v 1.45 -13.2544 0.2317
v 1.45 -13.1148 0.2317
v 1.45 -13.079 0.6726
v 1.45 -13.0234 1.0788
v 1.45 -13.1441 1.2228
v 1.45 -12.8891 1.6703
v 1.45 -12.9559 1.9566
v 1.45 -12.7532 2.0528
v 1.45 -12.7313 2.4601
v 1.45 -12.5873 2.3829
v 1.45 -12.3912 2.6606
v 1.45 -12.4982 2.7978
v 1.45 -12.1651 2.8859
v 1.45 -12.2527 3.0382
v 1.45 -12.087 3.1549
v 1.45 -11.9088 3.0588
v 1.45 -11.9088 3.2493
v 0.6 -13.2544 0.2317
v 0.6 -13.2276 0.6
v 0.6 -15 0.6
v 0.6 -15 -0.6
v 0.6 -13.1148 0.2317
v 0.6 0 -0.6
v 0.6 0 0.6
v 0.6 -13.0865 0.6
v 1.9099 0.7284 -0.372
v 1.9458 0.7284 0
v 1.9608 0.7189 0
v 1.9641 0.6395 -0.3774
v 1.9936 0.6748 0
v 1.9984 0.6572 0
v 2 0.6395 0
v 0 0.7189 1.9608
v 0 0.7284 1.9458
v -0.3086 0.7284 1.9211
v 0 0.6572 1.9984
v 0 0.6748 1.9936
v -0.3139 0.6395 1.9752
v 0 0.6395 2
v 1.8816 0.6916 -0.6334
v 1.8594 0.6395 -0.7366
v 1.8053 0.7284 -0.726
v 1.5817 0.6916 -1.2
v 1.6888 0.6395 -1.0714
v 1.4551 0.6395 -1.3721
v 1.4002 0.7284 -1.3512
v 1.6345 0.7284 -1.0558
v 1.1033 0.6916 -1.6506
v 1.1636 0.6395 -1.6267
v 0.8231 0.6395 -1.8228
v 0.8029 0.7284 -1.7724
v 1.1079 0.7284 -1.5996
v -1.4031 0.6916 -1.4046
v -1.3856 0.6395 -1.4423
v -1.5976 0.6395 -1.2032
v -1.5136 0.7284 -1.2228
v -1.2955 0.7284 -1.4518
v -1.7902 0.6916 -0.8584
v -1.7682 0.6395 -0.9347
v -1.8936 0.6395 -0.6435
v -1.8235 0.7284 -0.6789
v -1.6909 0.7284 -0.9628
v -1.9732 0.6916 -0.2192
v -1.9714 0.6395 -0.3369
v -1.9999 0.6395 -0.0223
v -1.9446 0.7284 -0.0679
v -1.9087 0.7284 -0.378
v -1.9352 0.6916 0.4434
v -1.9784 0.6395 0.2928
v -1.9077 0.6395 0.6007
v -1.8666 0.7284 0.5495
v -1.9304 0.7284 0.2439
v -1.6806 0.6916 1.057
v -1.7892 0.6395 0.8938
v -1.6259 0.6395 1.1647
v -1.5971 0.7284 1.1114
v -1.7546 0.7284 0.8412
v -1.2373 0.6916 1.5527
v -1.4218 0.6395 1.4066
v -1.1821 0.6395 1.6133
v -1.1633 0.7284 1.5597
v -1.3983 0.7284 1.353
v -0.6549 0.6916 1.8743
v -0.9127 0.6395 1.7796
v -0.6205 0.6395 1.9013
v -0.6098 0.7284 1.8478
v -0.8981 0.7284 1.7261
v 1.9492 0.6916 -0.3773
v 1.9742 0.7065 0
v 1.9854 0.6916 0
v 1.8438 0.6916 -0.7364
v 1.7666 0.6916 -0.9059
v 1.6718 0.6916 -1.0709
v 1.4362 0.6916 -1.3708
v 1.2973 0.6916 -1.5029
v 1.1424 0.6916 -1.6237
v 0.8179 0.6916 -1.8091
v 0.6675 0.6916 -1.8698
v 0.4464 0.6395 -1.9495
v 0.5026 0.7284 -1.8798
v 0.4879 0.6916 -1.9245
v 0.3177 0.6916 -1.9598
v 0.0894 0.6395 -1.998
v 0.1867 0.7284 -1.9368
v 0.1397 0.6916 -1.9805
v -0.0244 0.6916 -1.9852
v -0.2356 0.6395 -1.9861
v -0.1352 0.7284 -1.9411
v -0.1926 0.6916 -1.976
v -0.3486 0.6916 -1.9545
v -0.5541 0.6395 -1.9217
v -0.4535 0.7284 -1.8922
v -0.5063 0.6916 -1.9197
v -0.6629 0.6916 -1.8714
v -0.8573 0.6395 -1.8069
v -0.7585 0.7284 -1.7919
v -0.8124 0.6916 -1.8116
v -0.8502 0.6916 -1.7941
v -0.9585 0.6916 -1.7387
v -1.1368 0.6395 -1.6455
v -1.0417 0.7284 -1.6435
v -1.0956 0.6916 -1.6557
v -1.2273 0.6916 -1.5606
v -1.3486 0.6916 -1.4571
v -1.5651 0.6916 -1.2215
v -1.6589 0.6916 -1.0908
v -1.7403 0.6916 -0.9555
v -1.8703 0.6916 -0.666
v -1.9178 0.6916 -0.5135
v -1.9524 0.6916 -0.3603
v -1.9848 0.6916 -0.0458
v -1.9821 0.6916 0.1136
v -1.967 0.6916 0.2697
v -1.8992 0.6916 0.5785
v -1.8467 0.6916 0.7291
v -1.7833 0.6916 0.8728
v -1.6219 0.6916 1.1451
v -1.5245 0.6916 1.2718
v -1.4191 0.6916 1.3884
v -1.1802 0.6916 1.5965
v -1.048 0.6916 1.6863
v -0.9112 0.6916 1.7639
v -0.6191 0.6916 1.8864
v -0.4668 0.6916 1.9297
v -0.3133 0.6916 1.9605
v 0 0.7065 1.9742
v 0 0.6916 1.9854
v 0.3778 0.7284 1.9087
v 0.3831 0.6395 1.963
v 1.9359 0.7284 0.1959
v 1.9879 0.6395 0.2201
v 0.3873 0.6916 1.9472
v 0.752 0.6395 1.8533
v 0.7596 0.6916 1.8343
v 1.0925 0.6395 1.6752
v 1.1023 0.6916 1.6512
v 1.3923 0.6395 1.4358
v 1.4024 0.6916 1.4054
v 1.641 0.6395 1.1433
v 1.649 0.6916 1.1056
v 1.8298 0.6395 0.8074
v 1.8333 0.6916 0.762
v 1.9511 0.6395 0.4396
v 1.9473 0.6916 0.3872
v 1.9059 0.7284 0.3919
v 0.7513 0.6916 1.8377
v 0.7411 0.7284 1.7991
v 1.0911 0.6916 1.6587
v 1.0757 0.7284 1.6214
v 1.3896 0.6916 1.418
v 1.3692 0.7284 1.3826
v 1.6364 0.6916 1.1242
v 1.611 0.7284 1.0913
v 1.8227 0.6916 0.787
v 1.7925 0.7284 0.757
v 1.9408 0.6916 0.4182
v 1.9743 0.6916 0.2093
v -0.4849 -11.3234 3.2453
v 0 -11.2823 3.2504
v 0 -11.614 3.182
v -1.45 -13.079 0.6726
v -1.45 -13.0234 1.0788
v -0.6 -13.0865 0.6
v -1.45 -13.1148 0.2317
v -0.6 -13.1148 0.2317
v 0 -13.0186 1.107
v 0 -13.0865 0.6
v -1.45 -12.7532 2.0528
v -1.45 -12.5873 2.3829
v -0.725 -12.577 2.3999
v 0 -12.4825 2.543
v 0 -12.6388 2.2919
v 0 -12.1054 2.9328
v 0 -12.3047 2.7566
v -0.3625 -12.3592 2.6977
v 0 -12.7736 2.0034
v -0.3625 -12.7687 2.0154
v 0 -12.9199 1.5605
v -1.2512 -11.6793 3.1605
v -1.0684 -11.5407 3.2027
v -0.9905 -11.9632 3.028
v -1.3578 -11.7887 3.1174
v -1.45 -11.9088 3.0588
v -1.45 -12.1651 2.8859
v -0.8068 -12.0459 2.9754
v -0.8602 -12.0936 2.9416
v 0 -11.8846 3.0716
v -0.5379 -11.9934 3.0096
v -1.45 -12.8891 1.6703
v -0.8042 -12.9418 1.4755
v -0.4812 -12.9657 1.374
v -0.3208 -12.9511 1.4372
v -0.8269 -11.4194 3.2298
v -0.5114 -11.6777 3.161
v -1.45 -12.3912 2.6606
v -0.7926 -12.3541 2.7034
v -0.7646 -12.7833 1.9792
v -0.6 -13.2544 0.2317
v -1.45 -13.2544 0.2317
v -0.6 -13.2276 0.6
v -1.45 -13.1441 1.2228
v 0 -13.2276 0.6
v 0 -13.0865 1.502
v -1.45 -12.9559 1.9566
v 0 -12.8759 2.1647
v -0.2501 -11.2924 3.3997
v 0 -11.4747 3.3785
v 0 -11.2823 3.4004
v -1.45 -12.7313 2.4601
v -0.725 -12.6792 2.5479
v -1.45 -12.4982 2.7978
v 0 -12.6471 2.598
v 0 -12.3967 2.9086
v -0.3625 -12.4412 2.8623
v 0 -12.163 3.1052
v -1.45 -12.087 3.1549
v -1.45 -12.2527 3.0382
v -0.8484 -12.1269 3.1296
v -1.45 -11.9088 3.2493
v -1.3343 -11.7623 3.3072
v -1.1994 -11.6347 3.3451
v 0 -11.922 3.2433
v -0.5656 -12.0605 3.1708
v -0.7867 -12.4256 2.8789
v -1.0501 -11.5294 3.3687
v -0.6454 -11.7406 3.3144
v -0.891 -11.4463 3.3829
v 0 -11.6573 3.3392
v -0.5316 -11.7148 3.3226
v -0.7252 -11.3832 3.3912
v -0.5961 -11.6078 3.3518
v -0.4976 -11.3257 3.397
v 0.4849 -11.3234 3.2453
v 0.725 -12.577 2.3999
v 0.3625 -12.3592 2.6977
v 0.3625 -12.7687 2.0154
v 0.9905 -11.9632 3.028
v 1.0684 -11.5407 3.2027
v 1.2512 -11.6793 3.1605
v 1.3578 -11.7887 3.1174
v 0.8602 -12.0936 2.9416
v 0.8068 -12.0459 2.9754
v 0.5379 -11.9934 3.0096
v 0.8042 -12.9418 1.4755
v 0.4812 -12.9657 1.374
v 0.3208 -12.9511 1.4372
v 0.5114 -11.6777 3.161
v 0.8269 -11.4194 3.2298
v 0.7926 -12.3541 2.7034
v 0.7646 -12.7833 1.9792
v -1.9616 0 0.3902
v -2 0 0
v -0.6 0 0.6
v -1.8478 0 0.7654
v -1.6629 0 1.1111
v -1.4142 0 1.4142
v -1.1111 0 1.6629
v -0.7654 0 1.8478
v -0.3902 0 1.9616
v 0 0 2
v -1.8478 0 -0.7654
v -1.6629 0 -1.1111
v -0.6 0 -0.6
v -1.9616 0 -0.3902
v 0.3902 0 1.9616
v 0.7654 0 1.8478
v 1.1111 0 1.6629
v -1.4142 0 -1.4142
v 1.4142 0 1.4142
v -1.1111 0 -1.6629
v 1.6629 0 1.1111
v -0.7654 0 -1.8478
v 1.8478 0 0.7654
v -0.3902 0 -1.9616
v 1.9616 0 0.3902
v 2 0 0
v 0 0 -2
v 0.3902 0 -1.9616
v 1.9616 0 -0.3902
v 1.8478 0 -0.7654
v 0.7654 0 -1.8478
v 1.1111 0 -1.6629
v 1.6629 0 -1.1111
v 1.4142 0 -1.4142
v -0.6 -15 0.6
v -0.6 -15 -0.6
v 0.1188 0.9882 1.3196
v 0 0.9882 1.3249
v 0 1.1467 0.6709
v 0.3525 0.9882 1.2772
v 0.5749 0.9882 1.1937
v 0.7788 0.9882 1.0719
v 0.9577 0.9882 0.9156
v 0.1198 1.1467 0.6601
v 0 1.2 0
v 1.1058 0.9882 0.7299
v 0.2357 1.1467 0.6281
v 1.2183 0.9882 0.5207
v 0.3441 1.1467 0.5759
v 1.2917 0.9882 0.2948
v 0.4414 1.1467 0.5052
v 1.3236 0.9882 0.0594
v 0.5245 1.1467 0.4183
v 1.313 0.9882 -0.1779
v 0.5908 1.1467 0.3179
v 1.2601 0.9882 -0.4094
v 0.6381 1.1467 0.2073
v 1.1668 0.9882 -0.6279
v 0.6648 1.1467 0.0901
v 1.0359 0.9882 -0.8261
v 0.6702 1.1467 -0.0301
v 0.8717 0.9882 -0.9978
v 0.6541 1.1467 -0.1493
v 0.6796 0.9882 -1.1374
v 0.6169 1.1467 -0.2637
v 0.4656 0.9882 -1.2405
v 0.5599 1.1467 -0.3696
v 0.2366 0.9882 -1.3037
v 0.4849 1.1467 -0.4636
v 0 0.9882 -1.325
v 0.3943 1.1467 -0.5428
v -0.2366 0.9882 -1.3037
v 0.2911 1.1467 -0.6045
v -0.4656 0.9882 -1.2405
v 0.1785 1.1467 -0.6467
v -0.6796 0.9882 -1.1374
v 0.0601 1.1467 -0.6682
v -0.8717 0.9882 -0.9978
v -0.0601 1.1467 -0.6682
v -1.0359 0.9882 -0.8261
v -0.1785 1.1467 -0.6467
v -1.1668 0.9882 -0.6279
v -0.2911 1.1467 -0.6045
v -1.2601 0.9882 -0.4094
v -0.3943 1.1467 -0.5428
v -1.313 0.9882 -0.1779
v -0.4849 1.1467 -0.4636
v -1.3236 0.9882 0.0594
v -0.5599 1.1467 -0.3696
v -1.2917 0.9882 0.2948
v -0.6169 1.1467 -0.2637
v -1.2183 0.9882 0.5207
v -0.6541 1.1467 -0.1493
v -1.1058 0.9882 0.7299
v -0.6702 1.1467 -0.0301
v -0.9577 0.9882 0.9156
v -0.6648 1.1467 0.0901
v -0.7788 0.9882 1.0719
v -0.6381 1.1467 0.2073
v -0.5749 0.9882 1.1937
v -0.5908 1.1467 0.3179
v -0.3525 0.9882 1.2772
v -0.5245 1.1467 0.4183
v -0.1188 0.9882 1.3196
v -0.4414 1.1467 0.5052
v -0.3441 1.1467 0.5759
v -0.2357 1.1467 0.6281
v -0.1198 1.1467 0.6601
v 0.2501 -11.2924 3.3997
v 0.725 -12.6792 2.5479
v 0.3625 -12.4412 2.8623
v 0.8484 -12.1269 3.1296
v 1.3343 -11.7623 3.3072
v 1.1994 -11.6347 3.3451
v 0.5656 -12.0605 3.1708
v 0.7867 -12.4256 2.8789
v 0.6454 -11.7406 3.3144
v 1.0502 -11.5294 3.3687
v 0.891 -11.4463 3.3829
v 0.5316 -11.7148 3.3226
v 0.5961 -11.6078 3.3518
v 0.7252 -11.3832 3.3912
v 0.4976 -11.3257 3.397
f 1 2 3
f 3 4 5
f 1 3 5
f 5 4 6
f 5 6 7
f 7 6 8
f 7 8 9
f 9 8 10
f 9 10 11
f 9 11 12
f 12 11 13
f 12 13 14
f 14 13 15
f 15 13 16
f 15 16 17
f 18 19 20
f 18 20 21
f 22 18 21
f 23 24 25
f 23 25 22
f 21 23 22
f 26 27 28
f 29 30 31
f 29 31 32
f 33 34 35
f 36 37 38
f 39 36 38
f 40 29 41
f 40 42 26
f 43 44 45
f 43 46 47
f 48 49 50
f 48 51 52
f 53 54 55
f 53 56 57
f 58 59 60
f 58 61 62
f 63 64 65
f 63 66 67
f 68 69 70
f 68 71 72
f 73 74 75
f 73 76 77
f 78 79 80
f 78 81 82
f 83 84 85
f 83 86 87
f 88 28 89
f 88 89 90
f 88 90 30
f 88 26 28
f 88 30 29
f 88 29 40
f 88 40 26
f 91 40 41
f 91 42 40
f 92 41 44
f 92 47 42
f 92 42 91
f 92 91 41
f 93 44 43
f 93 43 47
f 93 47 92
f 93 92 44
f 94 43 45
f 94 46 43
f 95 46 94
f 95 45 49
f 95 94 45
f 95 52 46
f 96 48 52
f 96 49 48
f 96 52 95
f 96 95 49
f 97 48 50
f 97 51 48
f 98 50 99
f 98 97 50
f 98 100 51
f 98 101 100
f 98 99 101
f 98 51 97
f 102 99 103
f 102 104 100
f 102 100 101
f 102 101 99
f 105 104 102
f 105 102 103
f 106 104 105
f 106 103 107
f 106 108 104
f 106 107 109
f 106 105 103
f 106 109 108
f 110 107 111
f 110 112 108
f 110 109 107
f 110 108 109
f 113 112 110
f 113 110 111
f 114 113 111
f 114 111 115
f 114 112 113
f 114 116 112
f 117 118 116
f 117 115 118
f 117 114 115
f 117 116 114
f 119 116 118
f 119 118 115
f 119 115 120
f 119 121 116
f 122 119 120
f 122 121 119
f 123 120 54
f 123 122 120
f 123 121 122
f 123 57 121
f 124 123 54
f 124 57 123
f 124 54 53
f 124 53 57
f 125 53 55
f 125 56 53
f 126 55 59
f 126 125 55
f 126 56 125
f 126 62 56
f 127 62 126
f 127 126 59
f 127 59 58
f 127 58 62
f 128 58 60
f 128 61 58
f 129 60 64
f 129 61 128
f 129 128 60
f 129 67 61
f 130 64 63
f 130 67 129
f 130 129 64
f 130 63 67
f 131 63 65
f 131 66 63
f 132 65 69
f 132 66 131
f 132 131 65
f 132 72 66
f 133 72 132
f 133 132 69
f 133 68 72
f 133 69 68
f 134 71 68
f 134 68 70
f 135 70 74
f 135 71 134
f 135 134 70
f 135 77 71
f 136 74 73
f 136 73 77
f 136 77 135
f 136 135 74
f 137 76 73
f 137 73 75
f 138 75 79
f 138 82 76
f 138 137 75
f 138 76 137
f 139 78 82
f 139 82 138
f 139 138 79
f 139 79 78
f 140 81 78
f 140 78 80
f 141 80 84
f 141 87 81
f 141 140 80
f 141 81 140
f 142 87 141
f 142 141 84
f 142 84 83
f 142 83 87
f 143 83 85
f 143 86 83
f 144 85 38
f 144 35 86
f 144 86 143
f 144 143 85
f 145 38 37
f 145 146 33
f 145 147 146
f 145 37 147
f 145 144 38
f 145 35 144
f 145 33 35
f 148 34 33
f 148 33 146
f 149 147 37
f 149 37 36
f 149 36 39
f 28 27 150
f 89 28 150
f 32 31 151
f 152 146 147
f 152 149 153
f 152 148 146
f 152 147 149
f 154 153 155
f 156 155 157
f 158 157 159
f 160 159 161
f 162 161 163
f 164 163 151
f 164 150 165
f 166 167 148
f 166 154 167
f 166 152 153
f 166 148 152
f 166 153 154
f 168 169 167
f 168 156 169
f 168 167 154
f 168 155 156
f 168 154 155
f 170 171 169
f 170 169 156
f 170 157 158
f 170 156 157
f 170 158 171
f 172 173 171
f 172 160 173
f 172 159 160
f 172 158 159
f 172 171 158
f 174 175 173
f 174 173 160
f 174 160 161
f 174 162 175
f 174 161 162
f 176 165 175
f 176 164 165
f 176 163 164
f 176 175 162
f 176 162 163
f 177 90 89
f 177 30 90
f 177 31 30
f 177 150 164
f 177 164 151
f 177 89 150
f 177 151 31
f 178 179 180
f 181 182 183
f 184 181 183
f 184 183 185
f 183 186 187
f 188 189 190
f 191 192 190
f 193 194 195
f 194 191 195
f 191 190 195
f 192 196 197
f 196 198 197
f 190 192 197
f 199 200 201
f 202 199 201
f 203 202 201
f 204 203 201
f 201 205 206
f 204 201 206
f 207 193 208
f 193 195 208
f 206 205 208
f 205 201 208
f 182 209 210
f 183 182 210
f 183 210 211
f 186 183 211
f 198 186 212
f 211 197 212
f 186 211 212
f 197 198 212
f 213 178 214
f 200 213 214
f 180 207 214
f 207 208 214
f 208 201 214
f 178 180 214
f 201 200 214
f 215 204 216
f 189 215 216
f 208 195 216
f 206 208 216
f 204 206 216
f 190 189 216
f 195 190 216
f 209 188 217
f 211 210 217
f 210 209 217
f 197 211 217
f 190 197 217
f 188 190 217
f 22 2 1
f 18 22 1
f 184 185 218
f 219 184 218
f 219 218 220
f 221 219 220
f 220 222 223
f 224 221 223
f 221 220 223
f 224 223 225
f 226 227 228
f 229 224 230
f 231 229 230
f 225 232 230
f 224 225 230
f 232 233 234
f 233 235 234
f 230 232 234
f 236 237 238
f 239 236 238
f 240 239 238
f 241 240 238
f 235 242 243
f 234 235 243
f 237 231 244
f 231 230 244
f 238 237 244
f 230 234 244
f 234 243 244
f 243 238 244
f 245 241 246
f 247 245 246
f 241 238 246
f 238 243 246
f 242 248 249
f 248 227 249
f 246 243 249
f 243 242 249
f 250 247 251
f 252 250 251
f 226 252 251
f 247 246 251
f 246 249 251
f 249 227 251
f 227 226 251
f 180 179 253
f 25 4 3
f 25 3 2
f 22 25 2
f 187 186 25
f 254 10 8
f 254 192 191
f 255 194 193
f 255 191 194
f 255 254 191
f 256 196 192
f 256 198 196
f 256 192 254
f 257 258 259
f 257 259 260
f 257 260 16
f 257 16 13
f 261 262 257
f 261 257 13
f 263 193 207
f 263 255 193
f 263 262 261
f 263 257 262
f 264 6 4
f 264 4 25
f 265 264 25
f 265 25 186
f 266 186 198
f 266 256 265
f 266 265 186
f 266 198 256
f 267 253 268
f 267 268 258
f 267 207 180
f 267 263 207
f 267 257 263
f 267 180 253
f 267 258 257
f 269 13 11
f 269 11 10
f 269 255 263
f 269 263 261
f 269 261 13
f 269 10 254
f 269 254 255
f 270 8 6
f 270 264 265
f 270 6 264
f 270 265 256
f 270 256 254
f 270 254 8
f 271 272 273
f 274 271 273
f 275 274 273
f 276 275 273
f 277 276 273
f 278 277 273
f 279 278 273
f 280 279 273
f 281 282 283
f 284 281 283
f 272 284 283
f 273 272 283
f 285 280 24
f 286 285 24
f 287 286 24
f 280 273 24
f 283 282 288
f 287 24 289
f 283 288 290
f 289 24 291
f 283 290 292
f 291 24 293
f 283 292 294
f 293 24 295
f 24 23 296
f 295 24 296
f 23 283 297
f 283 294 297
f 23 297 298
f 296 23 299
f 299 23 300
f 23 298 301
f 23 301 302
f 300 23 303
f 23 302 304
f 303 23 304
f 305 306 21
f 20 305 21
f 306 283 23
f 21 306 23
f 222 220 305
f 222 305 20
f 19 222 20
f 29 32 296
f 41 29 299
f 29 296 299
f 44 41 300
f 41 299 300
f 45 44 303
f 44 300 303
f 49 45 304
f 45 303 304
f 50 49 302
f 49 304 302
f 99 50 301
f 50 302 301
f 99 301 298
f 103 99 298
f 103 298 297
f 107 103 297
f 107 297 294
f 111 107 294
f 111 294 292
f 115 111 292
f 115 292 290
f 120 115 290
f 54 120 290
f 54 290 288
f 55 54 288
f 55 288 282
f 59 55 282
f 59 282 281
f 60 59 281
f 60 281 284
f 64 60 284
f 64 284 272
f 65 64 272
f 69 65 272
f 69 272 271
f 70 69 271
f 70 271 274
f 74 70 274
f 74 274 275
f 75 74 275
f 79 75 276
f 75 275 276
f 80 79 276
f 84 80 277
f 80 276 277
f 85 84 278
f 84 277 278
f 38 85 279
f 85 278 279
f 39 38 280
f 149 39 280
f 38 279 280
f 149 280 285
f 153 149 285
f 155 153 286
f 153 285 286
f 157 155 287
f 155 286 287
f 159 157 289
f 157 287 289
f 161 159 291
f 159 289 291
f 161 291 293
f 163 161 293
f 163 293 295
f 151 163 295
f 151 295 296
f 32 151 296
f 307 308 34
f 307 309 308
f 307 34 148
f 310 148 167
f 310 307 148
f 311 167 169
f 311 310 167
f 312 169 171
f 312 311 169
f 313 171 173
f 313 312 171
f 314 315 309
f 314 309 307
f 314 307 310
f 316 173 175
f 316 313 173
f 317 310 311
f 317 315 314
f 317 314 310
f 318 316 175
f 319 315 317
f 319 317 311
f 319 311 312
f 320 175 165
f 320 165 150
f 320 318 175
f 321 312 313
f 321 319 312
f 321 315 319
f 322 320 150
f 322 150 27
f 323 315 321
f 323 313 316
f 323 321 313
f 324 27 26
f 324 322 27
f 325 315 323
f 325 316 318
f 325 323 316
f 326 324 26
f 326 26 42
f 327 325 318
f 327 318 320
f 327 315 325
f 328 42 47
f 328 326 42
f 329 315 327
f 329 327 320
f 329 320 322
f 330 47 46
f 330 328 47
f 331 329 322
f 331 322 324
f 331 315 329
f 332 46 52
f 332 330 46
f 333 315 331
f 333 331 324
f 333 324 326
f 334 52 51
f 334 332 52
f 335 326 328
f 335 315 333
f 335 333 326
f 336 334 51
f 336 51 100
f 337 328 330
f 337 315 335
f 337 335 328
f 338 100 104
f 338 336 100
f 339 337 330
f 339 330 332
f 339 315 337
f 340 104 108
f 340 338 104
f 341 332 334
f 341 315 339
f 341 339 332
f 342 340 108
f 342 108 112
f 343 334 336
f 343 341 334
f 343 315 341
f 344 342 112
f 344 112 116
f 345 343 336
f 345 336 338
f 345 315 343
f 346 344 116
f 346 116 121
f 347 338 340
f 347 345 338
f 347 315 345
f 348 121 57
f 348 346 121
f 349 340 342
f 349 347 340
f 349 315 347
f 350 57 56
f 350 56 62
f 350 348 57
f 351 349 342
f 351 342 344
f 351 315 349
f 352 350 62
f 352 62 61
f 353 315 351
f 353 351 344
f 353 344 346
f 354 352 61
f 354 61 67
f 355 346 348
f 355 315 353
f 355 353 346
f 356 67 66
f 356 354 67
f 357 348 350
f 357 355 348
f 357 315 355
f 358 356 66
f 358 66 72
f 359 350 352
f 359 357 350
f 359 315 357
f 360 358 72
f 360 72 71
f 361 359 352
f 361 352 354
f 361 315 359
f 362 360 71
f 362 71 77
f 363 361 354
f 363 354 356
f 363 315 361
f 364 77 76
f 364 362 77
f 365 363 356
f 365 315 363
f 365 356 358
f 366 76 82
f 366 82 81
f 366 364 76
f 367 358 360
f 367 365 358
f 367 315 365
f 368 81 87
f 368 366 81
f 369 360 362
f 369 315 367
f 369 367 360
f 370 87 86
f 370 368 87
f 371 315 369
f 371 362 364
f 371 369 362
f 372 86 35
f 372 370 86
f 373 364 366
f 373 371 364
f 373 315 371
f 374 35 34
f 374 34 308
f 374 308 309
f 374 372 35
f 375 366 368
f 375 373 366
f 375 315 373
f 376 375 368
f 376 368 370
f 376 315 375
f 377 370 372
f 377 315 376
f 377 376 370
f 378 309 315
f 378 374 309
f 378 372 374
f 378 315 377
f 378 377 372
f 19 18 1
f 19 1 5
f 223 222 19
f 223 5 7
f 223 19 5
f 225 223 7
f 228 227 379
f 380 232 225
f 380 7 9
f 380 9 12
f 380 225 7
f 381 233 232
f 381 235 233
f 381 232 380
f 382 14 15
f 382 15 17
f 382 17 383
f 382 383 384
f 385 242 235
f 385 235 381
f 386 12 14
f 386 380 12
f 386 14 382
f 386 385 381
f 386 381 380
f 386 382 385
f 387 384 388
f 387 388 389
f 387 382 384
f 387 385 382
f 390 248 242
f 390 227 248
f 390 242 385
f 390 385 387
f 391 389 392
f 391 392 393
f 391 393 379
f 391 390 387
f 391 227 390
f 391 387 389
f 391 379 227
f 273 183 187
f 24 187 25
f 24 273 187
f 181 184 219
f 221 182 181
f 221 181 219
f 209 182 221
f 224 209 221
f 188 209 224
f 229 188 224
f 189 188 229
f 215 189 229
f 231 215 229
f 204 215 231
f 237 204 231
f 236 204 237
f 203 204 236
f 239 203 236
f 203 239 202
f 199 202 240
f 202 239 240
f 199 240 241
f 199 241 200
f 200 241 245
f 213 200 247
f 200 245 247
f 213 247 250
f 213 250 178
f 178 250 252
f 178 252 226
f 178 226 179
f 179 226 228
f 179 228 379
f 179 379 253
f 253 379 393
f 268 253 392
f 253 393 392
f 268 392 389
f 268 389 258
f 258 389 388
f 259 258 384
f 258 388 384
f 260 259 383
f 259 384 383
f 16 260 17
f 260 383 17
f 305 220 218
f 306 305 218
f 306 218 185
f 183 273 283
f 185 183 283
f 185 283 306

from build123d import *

# Parameters (mm, degrees)
SKETCH1_W           = 1.2
SKETCH1_H           = 1.2
BOSS_EXTRUDE1_DEPTH = 15
SKETCH2_R           = 2
BOSS_EXTRUDE2_DEPTH = 0.7
DOME1_FACE_RADIUS   = 2
DOME1_HEIGHT        = 0.5
FILLET1_R           = 0.1
BOSS_EXTRUDE4_DEPTH = 1.45
CUT_EXTRUDE1_DEPTH  = 1


with BuildPart() as part:
    # Sketch1 → Boss-Extrude1 (new body)
    with BuildSketch(Plane(origin=(0, 0, 0), x_dir=(1, 0, 0), z_dir=(0, 1, 0))):
        Rectangle(SKETCH1_W, SKETCH1_H)
    extrude(amount=-BOSS_EXTRUDE1_DEPTH)

    # Sketch2 → Boss-Extrude2 (add)
    with BuildSketch(Plane(origin=(0, 0, 0), x_dir=(1, 0, 0), z_dir=(0, 1, 0))):
        Circle(SKETCH2_R)
    extrude(amount=BOSS_EXTRUDE2_DEPTH)

    # Dome1: a dome of height H over a round flat face of radius A is a cap of a sphere of radius (A * A + H * H) / (2 * H)
    dome1_r = (DOME1_FACE_RADIUS * DOME1_FACE_RADIUS + DOME1_HEIGHT * DOME1_HEIGHT) / (2 * DOME1_HEIGHT)
    dome1_base = Plane((0, 0.7, 0), z_dir=(0, 1, 0))
    with Locations(dome1_base.offset(DOME1_HEIGHT - dome1_r)):
        dome1_ball = Sphere(dome1_r, mode=Mode.PRIVATE)
    add(split(dome1_ball, bisect_by=dome1_base, keep=Keep.TOP, mode=Mode.PRIVATE))

    # Fillet1
    fillet1_edges = [part.edges().sort_by_distance(p)[0] for p in [
        (1.414213562, 0.7, 1.414213562),
    ]]
    fillet(fillet1_edges, radius=FILLET1_R)

    # Sketch4 → Boss-Extrude4 (add, symmetric)
    with BuildSketch(Plane(origin=(0, 0, 0), x_dir=(0, 0, -1), z_dir=(1, 0, 0))):
        with BuildLine():
            Line((-3.400384666, -11.282296636), (-3.250384666, -11.282296636))
            add(Edge.make_bspline(
                [(-3.250384666, -11.282296636), (-3.058673713, -12.955552301), (-0.231679409, -13.114795391)],
                knots=[0, 0, 0, 1, 1, 1], degree=2))
            Line((-0.231679409, -13.114795391), (-0.231679409, -13.25444953))
            add(Edge.make_bspline(
                [(-0.231679409, -13.25444953), (-3.279731306, -13.089972513), (-3.400384666, -11.282296636)],
                knots=[0, 0, 0, 1, 1, 1], degree=2))
        make_face()
    extrude(amount=BOSS_EXTRUDE4_DEPTH, both=True)

    # Sketch5 → Cut-Extrude1 (cut)
    with BuildSketch(Plane.XY.offset(3.6)):
        with BuildLine():
            Line((-1.635819389, -12.289770392), (-1.922071278, -12.289770392))
            Line((-1.922071278, -12.289770392), (-2.158832672, -10.523660328))
            Line((-2.158832672, -10.523660328), (2.212133916, -10.523660328))
            Line((2.212133916, -10.523660328), (1.968647058, -12.372871294))
            Line((1.968647058, -12.372871294), (1.635819389, -12.289770392))
            add(Edge.make_bspline(
                [(0, -11.282296636), (1.297822629, -11.282296636), (1.635819389, -12.289770392)],
                knots=[0, 0, 0, 1, 1, 1], degree=2))
            add(Edge.make_bspline(
                [(0, -11.282296636), (-1.297822629, -11.282296636), (-1.635819389, -12.289770392)],
                knots=[0, 0, 0, 1, 1, 1], degree=2))
        make_face()
    extrude(amount=-CUT_EXTRUDE1_DEPTH, mode=Mode.SUBTRACT)


solid = part.part
